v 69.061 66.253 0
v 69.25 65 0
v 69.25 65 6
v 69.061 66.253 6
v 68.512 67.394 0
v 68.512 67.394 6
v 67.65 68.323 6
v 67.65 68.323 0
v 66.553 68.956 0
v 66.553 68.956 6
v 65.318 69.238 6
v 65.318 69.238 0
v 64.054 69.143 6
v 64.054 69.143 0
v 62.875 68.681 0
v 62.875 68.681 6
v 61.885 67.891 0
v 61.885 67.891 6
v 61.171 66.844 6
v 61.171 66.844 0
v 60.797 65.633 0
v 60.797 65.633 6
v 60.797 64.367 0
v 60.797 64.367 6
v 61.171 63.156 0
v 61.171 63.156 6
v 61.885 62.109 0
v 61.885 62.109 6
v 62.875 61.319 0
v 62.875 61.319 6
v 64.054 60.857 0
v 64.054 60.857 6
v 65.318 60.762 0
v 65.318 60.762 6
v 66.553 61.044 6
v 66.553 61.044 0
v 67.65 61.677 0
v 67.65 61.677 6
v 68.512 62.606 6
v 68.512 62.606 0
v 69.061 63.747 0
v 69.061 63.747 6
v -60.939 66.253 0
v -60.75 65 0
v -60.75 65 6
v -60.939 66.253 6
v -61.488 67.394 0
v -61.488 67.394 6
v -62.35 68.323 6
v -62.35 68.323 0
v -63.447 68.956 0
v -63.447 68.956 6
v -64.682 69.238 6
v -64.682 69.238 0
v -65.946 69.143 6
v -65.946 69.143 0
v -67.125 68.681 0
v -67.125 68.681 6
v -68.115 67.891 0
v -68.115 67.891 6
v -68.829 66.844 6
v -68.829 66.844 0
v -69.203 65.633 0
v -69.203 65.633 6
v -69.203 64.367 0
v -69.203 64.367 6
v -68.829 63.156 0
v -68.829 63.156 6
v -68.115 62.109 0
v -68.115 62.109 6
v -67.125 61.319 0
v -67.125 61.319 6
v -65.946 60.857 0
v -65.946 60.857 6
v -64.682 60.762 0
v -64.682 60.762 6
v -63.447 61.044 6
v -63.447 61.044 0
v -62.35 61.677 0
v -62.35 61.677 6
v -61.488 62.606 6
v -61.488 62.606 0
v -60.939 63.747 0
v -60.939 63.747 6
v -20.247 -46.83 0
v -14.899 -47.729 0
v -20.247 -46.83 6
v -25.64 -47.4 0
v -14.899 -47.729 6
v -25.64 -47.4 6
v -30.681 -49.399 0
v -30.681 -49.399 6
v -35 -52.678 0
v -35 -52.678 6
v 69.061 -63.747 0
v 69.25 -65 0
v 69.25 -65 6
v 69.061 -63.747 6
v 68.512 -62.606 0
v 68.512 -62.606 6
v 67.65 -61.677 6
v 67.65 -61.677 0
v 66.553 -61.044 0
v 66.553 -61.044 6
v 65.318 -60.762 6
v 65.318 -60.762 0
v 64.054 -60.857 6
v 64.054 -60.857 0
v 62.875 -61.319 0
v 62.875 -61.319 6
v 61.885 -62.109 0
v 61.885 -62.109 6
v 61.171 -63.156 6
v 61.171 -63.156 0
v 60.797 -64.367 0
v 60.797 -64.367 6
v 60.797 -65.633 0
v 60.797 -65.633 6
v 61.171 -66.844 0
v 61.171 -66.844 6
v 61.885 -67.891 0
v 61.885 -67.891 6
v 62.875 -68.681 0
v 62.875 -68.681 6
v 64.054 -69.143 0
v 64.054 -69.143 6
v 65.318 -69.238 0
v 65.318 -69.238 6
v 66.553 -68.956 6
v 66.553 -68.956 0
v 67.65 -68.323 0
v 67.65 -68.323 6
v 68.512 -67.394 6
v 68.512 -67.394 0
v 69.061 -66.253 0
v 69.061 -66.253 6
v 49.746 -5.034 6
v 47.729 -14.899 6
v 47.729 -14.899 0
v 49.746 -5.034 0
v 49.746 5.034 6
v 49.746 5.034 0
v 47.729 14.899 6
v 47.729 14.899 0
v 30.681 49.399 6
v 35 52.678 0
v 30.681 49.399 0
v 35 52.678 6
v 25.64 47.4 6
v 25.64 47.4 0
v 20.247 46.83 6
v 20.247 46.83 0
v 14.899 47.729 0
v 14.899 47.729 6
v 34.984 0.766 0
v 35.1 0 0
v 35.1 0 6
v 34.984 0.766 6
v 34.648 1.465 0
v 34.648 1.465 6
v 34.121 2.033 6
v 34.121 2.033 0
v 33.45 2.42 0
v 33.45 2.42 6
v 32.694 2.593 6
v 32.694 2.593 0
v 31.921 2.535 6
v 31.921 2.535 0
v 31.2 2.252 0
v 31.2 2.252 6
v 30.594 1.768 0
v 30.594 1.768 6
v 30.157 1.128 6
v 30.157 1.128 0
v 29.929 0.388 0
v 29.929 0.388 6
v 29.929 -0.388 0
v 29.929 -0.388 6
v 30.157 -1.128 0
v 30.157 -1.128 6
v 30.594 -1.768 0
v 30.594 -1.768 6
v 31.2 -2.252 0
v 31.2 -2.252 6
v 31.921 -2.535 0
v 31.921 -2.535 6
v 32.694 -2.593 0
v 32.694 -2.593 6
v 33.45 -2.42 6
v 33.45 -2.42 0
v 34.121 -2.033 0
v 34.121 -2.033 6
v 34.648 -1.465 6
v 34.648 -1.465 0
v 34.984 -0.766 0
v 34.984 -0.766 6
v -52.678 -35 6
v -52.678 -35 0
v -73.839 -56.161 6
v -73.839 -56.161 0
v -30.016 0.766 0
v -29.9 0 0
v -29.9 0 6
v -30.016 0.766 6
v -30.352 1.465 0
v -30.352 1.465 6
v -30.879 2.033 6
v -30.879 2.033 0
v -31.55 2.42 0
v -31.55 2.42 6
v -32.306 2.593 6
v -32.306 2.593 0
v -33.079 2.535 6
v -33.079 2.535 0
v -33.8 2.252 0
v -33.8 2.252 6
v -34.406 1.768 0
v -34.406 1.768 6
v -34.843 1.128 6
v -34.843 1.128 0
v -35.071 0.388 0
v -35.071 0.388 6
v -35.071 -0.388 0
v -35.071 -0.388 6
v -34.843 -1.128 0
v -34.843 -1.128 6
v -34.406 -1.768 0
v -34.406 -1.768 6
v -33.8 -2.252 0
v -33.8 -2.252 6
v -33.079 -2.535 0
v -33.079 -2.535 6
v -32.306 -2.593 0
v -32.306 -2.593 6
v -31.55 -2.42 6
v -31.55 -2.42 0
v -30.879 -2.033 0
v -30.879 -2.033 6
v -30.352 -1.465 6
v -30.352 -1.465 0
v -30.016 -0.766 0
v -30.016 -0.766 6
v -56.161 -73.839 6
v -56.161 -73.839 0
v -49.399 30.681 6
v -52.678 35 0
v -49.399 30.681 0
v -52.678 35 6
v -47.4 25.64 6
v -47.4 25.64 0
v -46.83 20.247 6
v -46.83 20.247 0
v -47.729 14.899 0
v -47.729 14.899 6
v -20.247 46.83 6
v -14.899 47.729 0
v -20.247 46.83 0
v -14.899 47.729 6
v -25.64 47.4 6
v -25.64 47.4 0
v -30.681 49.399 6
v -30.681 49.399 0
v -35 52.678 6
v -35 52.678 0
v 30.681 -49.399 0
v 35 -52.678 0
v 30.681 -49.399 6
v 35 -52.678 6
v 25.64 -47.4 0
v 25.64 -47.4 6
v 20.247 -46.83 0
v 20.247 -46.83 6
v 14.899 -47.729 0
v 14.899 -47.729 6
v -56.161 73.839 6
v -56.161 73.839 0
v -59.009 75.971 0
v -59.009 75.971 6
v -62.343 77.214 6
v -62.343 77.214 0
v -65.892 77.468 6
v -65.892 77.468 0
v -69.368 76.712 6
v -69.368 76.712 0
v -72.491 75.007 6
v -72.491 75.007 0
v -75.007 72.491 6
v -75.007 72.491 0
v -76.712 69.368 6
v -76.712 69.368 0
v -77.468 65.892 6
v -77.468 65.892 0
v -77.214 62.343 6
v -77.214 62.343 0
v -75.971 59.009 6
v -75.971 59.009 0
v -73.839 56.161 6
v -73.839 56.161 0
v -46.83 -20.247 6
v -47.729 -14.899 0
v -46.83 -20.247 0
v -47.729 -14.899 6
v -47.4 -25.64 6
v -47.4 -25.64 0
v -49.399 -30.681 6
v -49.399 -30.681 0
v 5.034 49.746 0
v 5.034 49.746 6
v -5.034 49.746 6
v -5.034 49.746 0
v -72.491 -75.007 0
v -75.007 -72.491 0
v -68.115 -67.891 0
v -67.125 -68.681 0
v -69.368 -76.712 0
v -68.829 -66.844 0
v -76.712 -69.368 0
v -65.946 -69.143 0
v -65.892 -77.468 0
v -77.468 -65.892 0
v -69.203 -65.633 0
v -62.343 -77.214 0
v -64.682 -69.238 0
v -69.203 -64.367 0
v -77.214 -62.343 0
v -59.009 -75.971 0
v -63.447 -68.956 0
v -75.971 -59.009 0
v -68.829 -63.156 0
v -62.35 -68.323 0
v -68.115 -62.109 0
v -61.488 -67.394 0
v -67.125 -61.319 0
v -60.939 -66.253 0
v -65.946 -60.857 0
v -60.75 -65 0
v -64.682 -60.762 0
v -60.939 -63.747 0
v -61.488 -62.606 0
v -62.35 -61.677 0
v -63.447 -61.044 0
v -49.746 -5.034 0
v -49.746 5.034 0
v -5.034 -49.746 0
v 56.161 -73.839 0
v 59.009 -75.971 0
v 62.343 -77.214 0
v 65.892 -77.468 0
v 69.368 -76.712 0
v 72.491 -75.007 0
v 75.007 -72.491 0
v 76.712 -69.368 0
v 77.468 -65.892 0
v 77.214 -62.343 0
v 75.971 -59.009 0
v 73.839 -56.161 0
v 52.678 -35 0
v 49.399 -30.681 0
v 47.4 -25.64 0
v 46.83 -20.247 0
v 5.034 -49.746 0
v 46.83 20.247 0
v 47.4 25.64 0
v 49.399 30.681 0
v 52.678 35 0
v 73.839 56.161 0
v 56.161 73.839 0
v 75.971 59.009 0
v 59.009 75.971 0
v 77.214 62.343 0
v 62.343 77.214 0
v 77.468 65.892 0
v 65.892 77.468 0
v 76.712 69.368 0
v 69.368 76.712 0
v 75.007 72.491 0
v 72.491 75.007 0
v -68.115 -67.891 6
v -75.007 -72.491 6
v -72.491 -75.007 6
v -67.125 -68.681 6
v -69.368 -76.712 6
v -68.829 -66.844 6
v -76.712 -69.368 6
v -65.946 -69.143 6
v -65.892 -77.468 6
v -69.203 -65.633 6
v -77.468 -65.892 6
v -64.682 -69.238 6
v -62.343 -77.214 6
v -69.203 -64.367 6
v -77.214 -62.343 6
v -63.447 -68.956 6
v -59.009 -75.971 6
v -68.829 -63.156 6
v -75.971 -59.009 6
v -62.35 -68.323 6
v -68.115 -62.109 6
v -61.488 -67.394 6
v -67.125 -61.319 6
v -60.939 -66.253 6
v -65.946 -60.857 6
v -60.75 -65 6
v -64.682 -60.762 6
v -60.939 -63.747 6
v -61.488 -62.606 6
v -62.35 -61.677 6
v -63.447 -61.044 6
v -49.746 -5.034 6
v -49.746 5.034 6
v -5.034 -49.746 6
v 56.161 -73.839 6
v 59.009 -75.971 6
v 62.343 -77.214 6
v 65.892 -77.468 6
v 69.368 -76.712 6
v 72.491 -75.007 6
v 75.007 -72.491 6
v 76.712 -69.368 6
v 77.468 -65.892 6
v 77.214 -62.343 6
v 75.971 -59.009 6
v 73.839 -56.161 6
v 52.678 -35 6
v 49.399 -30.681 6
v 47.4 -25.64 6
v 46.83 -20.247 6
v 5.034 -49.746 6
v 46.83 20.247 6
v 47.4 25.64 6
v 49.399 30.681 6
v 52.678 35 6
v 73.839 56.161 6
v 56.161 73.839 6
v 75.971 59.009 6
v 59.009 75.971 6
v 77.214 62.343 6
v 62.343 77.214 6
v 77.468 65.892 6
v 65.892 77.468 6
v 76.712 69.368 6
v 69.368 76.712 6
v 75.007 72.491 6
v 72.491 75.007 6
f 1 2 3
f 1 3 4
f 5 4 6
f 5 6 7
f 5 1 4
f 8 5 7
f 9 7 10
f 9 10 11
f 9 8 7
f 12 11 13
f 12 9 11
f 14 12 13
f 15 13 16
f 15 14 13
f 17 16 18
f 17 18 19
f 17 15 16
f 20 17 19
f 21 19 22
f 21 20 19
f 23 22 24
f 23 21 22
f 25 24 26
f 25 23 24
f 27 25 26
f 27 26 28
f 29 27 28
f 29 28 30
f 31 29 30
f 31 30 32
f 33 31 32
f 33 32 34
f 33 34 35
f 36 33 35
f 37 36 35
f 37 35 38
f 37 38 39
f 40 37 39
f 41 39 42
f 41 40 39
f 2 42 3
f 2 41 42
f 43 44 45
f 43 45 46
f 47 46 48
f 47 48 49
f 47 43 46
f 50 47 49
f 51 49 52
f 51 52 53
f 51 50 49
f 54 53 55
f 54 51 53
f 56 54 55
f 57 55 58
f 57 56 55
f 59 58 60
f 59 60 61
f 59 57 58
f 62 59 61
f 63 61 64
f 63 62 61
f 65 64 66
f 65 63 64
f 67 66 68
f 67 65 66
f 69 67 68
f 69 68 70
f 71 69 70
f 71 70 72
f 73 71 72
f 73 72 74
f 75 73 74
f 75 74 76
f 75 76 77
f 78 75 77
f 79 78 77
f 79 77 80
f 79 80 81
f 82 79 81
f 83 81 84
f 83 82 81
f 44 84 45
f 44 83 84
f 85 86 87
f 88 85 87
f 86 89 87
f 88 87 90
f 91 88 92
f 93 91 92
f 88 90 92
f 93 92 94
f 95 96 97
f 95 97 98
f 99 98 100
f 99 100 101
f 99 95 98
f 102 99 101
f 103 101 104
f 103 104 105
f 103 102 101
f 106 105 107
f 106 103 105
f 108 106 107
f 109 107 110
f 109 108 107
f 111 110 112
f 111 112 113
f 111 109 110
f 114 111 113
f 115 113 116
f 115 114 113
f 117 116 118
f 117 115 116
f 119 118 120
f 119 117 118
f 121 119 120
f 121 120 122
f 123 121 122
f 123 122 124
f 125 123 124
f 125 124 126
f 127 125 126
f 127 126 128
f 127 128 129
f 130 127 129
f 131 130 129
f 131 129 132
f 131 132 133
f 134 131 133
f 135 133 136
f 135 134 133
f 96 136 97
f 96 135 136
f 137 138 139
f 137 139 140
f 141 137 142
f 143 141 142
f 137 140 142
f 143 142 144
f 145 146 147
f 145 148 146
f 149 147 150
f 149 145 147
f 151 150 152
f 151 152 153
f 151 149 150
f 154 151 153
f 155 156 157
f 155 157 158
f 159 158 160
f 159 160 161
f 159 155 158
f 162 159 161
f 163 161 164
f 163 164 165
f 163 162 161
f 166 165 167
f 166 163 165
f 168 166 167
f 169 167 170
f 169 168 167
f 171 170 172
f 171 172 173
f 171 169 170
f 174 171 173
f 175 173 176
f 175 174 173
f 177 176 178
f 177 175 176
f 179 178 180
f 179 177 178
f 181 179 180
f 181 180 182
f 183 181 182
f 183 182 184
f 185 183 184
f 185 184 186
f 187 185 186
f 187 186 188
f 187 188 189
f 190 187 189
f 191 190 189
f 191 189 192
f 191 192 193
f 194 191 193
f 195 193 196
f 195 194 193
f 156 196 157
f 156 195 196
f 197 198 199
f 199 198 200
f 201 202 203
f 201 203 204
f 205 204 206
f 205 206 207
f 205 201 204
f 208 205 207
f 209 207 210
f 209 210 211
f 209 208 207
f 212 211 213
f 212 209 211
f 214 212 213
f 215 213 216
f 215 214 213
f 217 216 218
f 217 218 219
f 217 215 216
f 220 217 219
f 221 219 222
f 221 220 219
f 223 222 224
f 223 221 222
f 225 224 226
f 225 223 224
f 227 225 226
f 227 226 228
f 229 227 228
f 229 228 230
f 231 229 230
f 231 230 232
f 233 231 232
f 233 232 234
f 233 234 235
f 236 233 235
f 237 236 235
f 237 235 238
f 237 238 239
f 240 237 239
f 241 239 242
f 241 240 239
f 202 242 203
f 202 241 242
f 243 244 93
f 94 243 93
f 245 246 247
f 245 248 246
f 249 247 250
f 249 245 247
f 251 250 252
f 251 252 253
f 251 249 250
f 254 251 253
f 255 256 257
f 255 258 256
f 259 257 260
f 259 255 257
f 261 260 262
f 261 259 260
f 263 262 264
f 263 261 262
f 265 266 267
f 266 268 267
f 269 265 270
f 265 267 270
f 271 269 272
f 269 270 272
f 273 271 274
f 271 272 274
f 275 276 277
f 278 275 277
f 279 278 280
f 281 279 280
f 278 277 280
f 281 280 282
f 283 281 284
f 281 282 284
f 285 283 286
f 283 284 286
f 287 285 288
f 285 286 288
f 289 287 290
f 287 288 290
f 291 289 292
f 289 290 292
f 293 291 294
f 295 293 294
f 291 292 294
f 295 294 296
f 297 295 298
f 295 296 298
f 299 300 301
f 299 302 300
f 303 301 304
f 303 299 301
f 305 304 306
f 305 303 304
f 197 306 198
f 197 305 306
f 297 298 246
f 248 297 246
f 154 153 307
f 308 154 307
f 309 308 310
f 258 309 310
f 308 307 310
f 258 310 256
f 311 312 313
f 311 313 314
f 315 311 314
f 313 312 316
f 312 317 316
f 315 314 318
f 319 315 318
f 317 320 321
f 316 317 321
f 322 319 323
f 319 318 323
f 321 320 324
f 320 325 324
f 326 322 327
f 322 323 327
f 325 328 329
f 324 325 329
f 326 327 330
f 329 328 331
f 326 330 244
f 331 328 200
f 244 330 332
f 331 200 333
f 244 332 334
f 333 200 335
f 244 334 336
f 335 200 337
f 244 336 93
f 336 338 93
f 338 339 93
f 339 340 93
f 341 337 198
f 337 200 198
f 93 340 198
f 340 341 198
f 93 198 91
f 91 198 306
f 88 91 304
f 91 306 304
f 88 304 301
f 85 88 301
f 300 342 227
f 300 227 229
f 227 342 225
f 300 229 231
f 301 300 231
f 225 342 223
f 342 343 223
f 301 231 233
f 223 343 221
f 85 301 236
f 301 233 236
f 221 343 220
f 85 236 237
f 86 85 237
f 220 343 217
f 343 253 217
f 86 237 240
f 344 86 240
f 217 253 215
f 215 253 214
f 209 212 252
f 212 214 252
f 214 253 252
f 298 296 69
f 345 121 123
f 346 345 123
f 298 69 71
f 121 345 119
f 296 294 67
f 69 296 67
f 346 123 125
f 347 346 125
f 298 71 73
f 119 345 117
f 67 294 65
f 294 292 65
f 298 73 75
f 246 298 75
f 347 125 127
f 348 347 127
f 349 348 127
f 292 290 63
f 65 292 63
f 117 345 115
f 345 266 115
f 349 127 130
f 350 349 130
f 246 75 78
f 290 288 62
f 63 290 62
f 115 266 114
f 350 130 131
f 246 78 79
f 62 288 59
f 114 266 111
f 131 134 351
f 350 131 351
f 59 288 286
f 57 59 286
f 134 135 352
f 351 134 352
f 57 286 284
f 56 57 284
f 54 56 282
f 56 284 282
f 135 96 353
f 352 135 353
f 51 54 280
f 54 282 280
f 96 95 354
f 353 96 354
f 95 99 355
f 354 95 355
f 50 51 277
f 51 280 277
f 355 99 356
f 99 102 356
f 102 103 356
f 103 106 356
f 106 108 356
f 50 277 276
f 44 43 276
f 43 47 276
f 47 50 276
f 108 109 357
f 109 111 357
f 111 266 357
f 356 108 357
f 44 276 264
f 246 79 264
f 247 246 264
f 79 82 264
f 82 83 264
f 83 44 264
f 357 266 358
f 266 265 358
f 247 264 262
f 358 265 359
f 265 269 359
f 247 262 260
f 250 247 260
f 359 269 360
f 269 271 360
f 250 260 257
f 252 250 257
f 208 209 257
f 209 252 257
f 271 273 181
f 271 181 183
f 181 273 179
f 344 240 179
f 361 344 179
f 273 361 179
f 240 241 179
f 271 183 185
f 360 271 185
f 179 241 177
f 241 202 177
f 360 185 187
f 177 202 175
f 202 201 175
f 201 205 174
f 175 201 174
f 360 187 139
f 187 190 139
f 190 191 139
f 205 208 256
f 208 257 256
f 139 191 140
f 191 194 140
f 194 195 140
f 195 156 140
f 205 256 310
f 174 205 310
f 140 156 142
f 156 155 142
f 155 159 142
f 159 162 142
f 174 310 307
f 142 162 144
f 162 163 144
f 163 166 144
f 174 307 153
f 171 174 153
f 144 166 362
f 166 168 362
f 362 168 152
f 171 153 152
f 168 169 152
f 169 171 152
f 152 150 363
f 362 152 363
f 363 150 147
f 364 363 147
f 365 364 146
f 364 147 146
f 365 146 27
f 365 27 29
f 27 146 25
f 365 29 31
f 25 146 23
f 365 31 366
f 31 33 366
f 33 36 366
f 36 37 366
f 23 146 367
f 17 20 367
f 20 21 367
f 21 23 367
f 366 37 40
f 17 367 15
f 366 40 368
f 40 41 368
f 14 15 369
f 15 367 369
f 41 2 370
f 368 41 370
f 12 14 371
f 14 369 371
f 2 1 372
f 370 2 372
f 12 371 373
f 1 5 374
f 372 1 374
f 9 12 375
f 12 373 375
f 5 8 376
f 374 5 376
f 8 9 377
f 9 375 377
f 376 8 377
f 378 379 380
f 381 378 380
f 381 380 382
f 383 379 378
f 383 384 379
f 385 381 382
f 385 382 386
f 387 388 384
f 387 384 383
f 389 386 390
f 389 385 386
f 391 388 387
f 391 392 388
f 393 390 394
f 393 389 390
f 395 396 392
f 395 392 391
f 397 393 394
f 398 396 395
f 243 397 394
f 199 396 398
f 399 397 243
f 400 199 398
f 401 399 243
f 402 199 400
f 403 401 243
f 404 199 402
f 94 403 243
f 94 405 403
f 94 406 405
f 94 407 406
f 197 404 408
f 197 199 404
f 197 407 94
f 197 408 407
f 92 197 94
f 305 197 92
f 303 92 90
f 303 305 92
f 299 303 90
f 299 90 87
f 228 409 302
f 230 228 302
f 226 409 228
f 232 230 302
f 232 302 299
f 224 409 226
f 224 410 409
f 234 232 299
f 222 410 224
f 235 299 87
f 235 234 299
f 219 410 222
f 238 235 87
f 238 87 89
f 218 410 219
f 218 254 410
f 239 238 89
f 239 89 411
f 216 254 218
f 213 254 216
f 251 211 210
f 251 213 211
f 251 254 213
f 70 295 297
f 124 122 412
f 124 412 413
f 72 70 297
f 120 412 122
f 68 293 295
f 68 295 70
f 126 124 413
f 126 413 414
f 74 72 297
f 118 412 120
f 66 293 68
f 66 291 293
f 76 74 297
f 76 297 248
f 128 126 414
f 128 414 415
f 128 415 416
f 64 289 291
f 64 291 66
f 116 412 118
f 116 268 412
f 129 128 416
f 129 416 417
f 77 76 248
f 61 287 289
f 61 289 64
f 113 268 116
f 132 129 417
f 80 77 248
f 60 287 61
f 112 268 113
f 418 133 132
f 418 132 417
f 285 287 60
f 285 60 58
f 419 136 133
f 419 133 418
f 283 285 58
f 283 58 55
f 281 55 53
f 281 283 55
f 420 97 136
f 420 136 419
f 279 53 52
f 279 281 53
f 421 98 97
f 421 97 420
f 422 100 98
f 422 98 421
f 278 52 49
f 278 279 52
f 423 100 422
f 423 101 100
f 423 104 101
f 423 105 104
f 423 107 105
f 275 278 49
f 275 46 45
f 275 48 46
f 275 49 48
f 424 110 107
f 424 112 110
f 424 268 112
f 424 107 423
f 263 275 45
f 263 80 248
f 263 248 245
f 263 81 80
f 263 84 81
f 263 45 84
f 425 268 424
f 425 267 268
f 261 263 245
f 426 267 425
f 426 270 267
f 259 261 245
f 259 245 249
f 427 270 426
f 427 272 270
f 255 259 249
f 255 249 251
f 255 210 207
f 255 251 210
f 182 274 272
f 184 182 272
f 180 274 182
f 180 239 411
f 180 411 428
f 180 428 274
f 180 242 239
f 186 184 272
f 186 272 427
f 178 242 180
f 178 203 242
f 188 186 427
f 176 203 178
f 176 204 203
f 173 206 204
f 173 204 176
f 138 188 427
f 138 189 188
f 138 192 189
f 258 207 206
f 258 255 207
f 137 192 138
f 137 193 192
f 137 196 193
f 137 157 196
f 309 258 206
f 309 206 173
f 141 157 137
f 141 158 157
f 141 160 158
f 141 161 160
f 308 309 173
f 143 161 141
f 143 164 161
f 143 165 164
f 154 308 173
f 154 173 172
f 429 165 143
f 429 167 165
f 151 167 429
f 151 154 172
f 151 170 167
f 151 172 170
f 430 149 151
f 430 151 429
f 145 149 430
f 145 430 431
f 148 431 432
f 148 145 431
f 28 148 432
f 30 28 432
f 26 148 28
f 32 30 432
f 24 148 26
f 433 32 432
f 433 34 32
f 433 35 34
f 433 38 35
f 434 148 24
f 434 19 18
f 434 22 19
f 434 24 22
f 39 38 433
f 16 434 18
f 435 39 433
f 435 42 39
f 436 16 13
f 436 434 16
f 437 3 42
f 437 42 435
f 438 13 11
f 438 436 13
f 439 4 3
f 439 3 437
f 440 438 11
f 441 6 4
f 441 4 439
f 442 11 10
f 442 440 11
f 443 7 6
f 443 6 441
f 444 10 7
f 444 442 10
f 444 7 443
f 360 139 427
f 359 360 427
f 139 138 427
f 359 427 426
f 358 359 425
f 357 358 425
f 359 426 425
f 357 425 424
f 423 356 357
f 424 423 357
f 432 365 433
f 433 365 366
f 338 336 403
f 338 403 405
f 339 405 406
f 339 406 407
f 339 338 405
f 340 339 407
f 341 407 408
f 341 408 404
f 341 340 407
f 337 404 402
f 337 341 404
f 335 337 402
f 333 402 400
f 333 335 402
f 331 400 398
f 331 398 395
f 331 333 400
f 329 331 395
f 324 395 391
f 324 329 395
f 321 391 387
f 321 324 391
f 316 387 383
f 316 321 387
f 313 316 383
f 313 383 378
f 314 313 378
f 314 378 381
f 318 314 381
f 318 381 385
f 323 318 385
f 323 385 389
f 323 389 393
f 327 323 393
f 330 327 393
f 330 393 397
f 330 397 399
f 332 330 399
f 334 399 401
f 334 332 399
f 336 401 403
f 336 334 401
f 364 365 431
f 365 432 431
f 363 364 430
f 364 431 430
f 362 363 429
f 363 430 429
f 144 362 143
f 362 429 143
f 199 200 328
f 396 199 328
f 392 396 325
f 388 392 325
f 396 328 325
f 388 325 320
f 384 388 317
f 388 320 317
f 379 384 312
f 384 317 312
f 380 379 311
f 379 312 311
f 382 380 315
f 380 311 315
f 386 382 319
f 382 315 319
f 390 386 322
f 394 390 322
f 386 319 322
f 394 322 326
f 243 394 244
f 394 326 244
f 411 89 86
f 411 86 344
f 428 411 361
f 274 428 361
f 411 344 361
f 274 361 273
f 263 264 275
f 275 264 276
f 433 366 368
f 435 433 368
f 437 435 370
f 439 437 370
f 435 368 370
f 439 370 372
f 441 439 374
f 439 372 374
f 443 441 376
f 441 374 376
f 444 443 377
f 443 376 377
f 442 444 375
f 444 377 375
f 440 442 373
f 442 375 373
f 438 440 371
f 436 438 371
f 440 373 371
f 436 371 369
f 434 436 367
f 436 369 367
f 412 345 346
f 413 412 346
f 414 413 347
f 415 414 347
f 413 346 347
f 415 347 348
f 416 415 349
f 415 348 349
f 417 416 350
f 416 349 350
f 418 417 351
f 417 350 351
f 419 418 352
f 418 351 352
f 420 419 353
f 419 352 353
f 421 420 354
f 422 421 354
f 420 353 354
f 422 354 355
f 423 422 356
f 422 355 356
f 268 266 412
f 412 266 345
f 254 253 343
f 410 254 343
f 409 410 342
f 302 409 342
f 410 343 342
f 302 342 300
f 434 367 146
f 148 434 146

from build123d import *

# Parameters (mm, degrees)
F0_R     = 4.25
F0_R_2   = 2.6
F1_DEPTH = 6
F2_R     = 20


with BuildPart() as f1:
    # F0 (on Top) → F1 (new body)
    with BuildSketch(Plane.XY):
        with BuildLine():
            Line((56.161165, 73.838835), (25.393825, 43.071495))
            ThreePointArc((25.393825, 43.071495), (0, 50), (-25.393825, 43.071495))
            Line((-25.393825, 43.071495), (-56.161165, 73.838835))
            ThreePointArc((-56.161165, 73.838835), (-73.838835, 73.838835), (-73.838835, 56.161165))
            Line((-73.838835, 56.161165), (-43.071495, 25.393825))
            ThreePointArc((-43.071495, 25.393825), (-50, 0), (-43.071495, -25.393825))
            Line((-43.071495, -25.393825), (-73.838835, -56.161165))
            ThreePointArc((-73.838835, -56.161165), (-73.838835, -73.838835), (-56.161165, -73.838835))
            Line((-56.161165, -73.838835), (-25.393825, -43.071495))
            ThreePointArc((-25.393825, -43.071495), (0, -50), (25.393825, -43.071495))
            Line((25.393825, -43.071495), (56.161165, -73.838835))
            ThreePointArc((56.161165, -73.838835), (73.838835, -73.838835), (73.838835, -56.161165))
            Line((73.838835, -56.161165), (43.071495, -25.393825))
            ThreePointArc((43.071495, -25.393825), (50, 0), (43.071495, 25.393825))
            Line((43.071495, 25.393825), (73.838835, 56.161165))
            ThreePointArc((73.838835, 56.161165), (73.838835, 73.838835), (56.161165, 73.838835))
        make_face()
        with Locations((-65, -65)):
            Circle(F0_R, mode=Mode.SUBTRACT)
        with Locations((65, -65)):
            Circle(F0_R, mode=Mode.SUBTRACT)
        with Locations((-32.5, 0)):
            Circle(F0_R_2, mode=Mode.SUBTRACT)
        with Locations((-65, 65)):
            Circle(F0_R, mode=Mode.SUBTRACT)
        with Locations((32.5, 0)):
            Circle(F0_R_2, mode=Mode.SUBTRACT)
        with Locations((65, 65)):
            Circle(F0_R, mode=Mode.SUBTRACT)
    extrude(amount=F1_DEPTH)

    # F2
    f2_edges = [f1.edges().sort_by_distance(p)[0] for p in [
        (-25.393825, -43.071495, 3),
        (25.393825, -43.071495, 3),
        (43.071495, -25.393825, 3),
        (43.071495, 25.393825, 3),
        (25.393825, 43.071495, 3),
        (-25.393825, 43.071495, 3),
        (-43.071495, 25.393825, 3),
        (-43.071495, -25.393825, 3),
    ]]
    fillet(f2_edges, radius=F2_R)


solid = f1.part
